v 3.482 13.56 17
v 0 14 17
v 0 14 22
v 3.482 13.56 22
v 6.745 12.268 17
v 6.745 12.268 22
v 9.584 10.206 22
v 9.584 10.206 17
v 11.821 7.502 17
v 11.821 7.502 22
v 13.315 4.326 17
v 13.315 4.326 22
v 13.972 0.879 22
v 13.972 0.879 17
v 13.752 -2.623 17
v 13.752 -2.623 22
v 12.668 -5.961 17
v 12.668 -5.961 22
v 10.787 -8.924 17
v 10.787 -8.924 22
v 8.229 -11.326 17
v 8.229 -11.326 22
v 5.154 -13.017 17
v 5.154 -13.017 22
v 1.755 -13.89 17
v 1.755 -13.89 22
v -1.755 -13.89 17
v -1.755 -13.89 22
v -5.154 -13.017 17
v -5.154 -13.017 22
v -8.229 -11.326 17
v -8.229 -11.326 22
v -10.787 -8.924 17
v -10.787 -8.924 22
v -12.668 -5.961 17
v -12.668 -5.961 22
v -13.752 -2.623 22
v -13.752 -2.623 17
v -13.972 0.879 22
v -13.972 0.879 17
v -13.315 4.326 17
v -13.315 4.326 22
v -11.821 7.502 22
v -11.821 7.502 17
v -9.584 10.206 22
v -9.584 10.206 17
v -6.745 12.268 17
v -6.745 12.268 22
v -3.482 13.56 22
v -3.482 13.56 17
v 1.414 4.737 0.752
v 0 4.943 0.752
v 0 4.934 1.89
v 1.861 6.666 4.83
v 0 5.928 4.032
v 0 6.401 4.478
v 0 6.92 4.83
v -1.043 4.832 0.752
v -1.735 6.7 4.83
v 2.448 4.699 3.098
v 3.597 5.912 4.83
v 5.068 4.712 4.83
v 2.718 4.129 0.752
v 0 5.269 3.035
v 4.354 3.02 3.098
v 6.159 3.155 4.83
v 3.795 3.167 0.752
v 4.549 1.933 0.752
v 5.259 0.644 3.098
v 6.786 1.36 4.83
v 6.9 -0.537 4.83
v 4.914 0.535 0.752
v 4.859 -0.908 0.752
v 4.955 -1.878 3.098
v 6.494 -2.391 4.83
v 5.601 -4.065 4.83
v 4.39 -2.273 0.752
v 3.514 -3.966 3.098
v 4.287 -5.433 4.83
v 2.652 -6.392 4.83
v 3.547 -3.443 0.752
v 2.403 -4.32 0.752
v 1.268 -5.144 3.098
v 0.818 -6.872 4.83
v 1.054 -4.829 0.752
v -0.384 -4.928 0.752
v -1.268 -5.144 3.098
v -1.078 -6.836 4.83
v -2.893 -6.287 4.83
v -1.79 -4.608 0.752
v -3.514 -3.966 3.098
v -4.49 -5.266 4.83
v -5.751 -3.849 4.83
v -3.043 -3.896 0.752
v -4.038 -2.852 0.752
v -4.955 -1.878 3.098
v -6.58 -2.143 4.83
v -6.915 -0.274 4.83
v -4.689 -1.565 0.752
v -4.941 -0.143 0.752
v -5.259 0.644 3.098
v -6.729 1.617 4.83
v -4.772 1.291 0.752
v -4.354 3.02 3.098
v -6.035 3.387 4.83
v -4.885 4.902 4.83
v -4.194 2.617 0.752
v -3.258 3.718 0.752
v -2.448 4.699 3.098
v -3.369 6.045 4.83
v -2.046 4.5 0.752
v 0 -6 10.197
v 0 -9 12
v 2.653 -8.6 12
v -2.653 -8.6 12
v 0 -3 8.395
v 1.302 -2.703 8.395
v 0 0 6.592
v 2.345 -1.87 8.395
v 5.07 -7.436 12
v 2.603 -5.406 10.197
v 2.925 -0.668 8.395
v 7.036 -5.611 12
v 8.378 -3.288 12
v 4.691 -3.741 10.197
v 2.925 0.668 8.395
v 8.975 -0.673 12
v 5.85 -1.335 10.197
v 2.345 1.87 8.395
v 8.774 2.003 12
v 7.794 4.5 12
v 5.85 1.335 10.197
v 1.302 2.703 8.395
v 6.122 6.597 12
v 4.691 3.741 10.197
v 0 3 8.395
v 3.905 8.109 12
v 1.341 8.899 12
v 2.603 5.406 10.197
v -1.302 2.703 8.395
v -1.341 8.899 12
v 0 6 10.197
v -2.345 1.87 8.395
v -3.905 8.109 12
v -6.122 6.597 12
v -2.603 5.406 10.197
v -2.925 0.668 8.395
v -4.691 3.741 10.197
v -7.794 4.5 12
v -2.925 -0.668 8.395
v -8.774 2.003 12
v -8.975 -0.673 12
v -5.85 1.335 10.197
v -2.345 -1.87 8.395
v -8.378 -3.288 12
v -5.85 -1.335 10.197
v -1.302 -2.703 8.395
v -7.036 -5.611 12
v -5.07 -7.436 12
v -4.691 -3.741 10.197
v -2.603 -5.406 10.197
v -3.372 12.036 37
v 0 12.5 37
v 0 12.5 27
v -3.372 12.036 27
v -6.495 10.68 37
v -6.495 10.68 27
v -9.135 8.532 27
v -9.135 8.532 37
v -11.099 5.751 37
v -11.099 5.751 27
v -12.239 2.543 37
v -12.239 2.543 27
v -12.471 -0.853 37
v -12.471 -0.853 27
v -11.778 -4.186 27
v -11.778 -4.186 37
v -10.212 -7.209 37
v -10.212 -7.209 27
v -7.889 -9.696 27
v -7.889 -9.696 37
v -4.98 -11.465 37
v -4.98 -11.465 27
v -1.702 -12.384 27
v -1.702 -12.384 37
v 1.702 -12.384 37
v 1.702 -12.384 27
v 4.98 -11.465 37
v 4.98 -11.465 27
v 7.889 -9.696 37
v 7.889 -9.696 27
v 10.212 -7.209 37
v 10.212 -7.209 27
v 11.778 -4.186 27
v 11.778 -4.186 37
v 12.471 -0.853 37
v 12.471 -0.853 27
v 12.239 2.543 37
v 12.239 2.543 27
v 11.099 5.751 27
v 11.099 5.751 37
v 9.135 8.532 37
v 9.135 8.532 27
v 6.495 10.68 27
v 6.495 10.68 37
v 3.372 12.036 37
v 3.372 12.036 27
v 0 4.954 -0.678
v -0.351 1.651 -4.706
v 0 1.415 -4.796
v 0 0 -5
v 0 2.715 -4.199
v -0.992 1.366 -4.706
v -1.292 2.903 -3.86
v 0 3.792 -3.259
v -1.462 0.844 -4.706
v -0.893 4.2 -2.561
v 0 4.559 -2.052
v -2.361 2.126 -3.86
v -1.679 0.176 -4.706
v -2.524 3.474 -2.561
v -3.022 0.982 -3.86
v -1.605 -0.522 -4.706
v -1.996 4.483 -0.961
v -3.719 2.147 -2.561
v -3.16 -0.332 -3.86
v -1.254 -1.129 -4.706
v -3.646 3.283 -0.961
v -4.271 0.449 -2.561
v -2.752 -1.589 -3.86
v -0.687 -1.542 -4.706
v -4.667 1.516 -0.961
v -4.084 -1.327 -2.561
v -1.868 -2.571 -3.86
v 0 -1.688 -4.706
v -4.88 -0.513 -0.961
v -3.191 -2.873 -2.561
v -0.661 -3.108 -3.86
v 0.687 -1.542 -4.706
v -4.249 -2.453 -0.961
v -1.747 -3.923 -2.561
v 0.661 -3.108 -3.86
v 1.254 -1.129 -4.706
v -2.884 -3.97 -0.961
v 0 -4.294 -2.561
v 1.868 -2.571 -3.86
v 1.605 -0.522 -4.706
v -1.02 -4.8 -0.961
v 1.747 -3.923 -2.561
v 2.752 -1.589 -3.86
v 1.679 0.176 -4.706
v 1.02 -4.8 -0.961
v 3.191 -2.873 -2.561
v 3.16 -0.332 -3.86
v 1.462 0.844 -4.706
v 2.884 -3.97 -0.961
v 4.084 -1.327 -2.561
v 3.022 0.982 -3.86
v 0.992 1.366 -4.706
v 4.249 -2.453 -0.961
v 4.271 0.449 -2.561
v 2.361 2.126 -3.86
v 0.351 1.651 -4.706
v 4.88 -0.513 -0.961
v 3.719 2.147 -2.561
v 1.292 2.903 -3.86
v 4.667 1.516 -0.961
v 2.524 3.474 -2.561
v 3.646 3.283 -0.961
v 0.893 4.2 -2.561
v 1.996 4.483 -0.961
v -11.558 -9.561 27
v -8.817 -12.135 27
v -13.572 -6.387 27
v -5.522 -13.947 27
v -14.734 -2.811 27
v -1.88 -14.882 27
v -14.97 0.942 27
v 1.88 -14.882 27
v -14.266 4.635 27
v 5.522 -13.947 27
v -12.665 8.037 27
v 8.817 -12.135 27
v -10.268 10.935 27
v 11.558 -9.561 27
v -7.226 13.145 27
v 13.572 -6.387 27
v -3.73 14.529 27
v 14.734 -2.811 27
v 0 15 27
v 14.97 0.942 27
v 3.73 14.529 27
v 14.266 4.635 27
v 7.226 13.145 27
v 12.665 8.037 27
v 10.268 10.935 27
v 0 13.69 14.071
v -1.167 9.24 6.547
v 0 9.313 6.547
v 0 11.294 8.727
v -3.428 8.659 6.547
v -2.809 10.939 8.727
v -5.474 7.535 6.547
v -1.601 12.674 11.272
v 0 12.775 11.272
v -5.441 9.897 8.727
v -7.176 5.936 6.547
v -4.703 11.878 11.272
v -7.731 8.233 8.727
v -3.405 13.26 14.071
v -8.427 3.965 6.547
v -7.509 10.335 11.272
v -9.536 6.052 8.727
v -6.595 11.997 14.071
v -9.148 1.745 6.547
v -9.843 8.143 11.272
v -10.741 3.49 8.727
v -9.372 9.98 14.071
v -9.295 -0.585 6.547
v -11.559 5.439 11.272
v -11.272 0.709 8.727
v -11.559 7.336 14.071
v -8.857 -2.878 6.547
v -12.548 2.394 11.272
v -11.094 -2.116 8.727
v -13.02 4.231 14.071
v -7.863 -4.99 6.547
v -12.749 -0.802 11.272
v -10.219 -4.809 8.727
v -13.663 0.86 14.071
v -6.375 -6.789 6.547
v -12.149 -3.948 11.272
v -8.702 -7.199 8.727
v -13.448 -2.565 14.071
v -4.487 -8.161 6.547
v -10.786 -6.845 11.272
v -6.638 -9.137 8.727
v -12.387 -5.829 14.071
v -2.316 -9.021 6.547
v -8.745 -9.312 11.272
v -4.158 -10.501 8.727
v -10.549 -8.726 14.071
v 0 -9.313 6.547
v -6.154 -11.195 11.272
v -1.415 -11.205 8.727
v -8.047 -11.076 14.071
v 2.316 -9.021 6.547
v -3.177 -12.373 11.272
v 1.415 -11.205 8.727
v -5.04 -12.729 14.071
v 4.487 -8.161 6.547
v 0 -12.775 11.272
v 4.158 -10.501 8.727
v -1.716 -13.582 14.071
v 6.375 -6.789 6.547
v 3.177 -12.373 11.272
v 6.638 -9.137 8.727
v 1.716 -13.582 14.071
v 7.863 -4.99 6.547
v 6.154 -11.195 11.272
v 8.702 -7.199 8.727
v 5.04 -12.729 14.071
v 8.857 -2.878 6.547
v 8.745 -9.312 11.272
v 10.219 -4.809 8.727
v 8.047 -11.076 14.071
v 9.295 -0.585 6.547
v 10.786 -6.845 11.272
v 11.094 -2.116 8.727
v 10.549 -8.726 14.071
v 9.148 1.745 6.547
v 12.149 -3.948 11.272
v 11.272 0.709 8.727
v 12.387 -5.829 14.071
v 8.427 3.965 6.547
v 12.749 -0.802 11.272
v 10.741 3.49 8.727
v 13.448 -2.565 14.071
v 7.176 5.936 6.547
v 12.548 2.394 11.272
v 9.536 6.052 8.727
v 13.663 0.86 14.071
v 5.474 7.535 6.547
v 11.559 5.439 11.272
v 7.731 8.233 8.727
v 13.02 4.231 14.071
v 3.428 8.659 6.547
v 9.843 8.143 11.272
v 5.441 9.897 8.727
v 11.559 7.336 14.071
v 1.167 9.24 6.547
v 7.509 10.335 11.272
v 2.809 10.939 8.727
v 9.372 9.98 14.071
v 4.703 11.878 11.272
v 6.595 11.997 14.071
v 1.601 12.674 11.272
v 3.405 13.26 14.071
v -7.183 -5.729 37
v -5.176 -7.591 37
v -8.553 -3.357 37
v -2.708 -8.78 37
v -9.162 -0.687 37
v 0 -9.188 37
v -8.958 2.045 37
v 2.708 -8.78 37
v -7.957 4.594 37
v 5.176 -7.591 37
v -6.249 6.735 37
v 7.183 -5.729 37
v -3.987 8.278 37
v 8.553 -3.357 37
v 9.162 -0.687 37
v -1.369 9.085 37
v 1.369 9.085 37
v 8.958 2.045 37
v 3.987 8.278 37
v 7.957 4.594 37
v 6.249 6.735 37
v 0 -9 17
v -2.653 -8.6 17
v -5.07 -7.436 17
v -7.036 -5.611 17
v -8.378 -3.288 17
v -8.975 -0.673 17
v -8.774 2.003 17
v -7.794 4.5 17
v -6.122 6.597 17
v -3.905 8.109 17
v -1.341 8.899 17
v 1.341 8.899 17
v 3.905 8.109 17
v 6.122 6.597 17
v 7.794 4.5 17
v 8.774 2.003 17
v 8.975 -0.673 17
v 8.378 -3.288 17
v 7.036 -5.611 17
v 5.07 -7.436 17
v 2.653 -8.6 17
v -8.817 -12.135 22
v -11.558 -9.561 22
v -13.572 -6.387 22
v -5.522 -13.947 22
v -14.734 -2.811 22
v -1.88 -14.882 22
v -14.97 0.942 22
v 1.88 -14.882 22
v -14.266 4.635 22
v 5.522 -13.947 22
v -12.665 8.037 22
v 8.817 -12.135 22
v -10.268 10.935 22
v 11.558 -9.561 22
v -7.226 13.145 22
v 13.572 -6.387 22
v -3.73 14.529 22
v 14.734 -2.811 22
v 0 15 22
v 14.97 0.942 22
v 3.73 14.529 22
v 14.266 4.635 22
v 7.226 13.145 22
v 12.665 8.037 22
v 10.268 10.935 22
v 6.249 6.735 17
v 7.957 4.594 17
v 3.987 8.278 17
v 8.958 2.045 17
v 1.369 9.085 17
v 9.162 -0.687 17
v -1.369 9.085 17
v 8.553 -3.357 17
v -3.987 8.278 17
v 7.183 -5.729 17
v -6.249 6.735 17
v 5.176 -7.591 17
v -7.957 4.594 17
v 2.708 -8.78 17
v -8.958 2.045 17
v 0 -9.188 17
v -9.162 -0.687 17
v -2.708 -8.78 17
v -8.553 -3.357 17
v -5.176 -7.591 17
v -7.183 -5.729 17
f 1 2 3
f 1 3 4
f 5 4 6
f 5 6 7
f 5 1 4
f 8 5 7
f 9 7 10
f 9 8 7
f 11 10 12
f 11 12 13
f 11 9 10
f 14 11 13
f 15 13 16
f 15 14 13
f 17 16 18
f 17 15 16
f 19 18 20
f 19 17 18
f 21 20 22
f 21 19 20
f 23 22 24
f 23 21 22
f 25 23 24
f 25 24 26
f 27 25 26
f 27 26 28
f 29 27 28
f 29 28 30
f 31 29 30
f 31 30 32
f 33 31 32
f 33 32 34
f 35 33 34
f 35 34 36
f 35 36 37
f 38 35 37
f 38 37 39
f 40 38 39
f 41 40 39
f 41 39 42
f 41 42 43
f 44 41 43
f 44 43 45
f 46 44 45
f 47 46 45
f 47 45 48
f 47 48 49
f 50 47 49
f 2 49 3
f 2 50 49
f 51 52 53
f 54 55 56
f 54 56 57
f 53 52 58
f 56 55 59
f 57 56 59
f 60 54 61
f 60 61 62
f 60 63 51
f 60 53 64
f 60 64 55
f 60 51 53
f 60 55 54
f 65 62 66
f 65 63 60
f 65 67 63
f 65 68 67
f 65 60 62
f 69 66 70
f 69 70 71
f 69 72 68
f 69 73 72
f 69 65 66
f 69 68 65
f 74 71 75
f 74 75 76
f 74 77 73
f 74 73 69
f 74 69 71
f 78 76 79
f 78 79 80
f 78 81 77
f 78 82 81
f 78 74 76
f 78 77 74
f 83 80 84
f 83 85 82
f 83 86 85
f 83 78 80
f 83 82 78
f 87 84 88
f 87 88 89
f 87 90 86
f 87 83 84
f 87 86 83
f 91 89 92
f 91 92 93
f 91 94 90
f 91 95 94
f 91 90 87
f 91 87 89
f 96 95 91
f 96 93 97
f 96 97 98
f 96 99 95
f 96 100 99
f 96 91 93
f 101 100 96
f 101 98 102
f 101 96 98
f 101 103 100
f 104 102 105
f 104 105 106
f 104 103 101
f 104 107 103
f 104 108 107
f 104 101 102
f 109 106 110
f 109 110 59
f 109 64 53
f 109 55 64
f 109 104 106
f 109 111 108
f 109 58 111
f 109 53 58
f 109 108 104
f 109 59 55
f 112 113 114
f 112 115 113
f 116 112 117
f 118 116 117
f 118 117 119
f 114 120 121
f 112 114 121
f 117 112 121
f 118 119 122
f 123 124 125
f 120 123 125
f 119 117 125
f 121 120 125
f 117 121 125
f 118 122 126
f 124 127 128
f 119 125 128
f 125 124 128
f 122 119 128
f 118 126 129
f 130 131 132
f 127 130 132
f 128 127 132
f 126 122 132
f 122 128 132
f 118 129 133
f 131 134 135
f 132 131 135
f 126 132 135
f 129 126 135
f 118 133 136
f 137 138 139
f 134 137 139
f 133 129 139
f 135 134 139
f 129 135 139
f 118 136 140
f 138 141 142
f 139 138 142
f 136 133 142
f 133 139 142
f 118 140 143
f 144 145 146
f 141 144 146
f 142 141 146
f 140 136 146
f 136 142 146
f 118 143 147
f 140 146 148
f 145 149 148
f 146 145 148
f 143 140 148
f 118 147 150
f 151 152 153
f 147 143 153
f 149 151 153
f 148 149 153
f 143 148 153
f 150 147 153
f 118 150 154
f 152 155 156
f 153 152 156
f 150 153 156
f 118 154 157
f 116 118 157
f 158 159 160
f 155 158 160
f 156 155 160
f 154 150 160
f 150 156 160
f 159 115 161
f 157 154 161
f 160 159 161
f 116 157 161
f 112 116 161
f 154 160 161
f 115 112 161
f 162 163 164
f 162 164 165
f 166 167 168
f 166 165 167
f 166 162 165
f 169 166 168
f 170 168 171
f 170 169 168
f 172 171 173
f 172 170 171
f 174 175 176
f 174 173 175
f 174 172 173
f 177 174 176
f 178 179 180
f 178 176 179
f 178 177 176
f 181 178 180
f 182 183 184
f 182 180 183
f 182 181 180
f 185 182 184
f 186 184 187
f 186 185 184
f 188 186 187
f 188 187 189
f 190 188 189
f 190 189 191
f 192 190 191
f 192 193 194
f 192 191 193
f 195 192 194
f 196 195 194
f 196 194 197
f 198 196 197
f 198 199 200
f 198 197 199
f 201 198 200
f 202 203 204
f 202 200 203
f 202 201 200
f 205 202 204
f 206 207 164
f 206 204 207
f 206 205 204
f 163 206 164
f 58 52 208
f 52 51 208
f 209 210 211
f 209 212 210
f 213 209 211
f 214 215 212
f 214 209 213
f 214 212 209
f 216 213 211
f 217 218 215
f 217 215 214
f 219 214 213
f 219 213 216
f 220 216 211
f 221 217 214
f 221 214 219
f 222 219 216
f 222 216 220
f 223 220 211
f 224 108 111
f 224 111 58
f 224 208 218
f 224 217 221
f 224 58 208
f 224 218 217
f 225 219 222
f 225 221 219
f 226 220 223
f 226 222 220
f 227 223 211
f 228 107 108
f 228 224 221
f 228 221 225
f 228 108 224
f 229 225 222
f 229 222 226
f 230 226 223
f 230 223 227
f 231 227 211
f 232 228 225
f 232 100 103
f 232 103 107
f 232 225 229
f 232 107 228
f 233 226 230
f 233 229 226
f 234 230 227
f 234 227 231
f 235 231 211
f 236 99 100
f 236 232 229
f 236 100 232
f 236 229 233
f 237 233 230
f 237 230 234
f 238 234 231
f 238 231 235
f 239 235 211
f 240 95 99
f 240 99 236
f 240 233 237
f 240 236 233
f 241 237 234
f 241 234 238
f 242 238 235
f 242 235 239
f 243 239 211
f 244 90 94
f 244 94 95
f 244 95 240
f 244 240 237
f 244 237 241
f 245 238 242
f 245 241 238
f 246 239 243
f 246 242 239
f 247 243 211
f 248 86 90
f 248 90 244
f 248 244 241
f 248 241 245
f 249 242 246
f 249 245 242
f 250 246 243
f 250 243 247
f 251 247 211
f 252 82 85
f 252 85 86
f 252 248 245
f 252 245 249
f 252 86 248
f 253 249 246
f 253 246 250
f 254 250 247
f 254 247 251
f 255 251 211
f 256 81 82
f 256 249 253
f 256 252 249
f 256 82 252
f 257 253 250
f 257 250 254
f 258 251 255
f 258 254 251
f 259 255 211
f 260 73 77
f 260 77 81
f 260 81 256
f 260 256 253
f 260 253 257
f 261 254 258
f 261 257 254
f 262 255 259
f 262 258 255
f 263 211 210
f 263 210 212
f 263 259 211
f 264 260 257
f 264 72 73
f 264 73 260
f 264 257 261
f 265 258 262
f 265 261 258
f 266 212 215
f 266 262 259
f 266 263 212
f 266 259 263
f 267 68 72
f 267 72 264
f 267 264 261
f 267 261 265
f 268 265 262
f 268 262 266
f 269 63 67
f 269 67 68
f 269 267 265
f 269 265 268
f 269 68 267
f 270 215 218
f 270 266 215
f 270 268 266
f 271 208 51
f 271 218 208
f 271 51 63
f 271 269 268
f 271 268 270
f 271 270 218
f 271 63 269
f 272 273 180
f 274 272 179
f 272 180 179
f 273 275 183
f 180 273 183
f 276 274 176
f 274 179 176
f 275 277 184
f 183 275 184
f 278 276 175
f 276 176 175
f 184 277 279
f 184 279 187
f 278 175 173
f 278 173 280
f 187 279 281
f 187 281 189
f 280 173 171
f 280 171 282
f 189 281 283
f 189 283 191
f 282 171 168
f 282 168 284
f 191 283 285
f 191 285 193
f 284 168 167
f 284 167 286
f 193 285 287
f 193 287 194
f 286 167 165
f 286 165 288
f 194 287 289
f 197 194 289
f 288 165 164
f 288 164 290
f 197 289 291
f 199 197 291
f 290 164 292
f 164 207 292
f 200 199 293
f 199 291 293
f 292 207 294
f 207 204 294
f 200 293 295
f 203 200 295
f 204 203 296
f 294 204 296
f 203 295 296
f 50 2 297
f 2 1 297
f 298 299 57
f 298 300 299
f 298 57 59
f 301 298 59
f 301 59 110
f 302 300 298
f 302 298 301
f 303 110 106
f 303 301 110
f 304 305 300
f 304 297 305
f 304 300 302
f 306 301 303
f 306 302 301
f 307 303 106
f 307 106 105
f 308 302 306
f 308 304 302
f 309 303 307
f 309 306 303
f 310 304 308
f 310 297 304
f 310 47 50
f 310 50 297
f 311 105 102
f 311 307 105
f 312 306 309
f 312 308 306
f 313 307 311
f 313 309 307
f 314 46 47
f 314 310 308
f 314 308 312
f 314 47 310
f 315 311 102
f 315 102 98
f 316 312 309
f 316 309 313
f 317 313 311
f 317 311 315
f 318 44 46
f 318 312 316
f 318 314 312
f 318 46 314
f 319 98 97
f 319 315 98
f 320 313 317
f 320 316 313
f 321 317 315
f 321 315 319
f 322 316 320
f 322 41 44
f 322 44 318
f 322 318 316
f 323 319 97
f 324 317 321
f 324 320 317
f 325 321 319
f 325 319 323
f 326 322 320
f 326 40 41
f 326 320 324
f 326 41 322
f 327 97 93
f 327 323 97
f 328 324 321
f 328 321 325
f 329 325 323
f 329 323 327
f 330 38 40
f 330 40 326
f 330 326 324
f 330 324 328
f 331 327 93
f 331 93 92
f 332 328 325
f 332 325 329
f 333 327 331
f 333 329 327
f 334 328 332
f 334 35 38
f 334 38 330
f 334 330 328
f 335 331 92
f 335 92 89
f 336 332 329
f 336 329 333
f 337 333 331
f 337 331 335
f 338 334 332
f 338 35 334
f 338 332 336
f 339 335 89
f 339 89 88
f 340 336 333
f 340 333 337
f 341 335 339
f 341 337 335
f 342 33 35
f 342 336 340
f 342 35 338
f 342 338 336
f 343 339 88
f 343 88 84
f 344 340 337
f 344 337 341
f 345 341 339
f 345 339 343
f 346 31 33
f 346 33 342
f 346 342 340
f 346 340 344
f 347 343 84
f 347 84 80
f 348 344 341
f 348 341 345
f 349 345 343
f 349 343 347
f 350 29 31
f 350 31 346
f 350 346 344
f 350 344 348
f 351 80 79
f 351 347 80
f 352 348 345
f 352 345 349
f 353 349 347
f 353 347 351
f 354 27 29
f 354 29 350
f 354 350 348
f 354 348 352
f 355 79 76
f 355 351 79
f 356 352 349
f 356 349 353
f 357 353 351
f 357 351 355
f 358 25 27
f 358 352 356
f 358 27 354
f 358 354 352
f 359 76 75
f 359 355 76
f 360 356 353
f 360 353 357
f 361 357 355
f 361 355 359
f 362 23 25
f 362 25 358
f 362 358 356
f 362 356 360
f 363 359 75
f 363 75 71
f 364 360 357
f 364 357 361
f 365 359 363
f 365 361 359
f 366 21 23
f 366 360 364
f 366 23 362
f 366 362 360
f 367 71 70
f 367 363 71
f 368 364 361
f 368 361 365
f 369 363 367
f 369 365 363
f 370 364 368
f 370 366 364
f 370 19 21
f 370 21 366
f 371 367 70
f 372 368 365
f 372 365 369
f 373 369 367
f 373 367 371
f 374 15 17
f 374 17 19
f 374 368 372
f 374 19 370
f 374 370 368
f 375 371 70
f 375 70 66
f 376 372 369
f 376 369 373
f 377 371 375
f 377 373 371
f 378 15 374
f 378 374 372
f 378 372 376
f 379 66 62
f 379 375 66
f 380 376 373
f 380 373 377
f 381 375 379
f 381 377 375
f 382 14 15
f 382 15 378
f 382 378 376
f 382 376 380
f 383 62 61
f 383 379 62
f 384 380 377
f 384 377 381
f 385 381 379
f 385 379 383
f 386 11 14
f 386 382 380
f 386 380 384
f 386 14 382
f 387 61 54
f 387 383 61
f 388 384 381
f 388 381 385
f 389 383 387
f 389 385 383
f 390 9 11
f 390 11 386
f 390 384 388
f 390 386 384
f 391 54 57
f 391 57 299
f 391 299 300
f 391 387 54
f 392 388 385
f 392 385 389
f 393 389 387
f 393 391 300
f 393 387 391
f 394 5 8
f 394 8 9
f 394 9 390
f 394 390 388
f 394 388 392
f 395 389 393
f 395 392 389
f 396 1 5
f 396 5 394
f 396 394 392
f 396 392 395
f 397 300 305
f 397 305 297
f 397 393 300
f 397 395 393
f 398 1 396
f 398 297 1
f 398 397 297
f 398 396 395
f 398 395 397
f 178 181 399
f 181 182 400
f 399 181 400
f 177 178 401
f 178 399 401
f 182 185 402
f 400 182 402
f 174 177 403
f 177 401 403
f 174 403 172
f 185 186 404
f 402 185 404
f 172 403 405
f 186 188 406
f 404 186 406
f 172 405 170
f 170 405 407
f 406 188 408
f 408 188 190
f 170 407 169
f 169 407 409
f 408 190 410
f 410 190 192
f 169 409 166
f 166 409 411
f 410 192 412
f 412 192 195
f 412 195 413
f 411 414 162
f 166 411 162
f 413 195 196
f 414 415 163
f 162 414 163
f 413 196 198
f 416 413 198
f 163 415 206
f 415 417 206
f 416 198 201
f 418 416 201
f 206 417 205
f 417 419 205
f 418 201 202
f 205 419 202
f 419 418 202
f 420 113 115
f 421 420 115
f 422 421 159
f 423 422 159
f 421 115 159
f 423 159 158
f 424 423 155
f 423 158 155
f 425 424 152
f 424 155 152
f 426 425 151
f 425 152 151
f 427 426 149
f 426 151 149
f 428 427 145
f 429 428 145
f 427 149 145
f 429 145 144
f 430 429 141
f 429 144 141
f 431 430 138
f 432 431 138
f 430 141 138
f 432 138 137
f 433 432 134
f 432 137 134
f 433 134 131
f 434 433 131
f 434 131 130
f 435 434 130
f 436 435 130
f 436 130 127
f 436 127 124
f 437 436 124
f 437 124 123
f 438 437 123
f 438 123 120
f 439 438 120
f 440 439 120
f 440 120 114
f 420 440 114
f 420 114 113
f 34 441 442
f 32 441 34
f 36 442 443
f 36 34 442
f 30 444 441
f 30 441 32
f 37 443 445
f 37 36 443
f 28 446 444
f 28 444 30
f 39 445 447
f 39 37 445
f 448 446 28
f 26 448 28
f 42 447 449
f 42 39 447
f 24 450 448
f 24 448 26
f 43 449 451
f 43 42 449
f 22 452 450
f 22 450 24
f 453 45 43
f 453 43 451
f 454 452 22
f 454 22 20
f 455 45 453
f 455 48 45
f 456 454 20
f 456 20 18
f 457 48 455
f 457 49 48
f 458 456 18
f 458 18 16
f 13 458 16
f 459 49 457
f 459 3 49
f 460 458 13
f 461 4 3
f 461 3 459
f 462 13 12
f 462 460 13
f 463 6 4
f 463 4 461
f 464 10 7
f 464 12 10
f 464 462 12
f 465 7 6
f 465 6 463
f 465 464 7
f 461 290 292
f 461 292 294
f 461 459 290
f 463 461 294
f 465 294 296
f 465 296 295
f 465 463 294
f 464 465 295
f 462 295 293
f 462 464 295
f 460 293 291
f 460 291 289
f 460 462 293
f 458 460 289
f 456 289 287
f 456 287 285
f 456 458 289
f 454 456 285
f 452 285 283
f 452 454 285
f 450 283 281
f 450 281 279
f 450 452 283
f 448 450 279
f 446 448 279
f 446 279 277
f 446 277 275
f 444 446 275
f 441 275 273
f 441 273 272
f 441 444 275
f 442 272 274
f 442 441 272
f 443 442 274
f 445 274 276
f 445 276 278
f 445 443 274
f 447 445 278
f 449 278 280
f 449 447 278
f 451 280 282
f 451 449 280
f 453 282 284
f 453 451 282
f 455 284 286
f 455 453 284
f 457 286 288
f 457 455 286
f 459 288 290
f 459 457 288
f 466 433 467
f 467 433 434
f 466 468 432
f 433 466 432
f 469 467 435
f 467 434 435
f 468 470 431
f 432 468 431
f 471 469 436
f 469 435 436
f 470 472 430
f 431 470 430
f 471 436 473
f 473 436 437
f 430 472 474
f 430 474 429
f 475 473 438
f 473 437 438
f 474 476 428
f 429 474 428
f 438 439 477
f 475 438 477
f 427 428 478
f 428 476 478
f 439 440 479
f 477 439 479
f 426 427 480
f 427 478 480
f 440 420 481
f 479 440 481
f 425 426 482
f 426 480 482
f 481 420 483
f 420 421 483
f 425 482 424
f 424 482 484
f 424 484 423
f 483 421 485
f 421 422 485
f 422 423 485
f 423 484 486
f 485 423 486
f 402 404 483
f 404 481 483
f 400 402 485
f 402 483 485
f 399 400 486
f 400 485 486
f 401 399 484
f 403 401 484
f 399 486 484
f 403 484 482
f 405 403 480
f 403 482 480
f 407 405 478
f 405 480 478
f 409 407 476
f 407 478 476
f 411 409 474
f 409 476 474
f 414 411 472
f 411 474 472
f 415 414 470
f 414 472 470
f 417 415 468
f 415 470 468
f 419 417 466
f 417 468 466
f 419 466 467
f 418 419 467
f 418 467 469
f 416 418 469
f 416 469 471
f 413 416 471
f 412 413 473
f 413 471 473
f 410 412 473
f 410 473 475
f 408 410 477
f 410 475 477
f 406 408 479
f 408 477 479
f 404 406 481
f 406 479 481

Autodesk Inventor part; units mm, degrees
ref_plane "YZ Plane" through (0, 0, 0) normal (1, 0, 0) x (0, 1, 0)
ref_plane "XZ Plane" through (0, 0, 0) normal (0, 1, 0) x (-1, 0, 0)
ref_plane "XY Plane" through (0, 0, 0) normal (0, 0, 1) x (1, 0, 0)
sketch "草圖1" plane through (0, 0, 0) normal (1, 0, 0) x (0, 1, 0)
  arc A0 (0, -5) -> (0, 5) centre (0, 0) ccw
  line L0 (0, 27) -> (12.5, 27)
  line L1 (12.5, 27) -> (12.5, 37)
  line L2 (12.5, 37) -> (0, 37)
  line L3 (0, 27) -> (15, 27)
  line L4 (15, 27) -> (15, 22)
  line L5 (15, 22) -> (0, 22)
  line L6 (0, 22) -> (0, 27)
  arc A1 (0, 3) -> (0, 31) centre (0, 17) ccw
  line L7 (14, 22) -> (14, 17)
  line L8 (0, 37) -> (0, -5)
  point P0 (3.5993, 3.4706)
  dimension "d0" = 10
  dimension "d2" = 12.5
  dimension "d3" = 10
  dimension "d4" = 15
  dimension "d10" = 20
  dimension "d11" = 5
  dimension "d12" = 27
revolve "迴轉1" add sketch "草圖1" angle 360 about axis through (0, 0, 37) along (0, 0, -1)
fillet "圓角1" radius 4 1 edges at (0, -3.5993, 3.4706)
sketch "草圖2" plane through (0, 0, 37) normal (0, 0, 1) x (1, 0, 0)
  point P0 (0, 0)
  point P1 (0, 0)
hole "孔1" at (0, 0, 37) direction (0, 0, -1) diameter 18 depth 25 tip angle 118
sketch "草圖3" plane through (0, 0, 37) normal (0, 0, 1) x (1, 0, 0)
  point P0 (0, 0)
  point P1 (0, 0)
hole "孔2" at (0, 0, 37) direction (0, 0, -1) diameter 18.376 depth 20 thread size "M20x1.5" class "6H" standard "ISO Metric profile"
properties part number "3. 砲尾"
